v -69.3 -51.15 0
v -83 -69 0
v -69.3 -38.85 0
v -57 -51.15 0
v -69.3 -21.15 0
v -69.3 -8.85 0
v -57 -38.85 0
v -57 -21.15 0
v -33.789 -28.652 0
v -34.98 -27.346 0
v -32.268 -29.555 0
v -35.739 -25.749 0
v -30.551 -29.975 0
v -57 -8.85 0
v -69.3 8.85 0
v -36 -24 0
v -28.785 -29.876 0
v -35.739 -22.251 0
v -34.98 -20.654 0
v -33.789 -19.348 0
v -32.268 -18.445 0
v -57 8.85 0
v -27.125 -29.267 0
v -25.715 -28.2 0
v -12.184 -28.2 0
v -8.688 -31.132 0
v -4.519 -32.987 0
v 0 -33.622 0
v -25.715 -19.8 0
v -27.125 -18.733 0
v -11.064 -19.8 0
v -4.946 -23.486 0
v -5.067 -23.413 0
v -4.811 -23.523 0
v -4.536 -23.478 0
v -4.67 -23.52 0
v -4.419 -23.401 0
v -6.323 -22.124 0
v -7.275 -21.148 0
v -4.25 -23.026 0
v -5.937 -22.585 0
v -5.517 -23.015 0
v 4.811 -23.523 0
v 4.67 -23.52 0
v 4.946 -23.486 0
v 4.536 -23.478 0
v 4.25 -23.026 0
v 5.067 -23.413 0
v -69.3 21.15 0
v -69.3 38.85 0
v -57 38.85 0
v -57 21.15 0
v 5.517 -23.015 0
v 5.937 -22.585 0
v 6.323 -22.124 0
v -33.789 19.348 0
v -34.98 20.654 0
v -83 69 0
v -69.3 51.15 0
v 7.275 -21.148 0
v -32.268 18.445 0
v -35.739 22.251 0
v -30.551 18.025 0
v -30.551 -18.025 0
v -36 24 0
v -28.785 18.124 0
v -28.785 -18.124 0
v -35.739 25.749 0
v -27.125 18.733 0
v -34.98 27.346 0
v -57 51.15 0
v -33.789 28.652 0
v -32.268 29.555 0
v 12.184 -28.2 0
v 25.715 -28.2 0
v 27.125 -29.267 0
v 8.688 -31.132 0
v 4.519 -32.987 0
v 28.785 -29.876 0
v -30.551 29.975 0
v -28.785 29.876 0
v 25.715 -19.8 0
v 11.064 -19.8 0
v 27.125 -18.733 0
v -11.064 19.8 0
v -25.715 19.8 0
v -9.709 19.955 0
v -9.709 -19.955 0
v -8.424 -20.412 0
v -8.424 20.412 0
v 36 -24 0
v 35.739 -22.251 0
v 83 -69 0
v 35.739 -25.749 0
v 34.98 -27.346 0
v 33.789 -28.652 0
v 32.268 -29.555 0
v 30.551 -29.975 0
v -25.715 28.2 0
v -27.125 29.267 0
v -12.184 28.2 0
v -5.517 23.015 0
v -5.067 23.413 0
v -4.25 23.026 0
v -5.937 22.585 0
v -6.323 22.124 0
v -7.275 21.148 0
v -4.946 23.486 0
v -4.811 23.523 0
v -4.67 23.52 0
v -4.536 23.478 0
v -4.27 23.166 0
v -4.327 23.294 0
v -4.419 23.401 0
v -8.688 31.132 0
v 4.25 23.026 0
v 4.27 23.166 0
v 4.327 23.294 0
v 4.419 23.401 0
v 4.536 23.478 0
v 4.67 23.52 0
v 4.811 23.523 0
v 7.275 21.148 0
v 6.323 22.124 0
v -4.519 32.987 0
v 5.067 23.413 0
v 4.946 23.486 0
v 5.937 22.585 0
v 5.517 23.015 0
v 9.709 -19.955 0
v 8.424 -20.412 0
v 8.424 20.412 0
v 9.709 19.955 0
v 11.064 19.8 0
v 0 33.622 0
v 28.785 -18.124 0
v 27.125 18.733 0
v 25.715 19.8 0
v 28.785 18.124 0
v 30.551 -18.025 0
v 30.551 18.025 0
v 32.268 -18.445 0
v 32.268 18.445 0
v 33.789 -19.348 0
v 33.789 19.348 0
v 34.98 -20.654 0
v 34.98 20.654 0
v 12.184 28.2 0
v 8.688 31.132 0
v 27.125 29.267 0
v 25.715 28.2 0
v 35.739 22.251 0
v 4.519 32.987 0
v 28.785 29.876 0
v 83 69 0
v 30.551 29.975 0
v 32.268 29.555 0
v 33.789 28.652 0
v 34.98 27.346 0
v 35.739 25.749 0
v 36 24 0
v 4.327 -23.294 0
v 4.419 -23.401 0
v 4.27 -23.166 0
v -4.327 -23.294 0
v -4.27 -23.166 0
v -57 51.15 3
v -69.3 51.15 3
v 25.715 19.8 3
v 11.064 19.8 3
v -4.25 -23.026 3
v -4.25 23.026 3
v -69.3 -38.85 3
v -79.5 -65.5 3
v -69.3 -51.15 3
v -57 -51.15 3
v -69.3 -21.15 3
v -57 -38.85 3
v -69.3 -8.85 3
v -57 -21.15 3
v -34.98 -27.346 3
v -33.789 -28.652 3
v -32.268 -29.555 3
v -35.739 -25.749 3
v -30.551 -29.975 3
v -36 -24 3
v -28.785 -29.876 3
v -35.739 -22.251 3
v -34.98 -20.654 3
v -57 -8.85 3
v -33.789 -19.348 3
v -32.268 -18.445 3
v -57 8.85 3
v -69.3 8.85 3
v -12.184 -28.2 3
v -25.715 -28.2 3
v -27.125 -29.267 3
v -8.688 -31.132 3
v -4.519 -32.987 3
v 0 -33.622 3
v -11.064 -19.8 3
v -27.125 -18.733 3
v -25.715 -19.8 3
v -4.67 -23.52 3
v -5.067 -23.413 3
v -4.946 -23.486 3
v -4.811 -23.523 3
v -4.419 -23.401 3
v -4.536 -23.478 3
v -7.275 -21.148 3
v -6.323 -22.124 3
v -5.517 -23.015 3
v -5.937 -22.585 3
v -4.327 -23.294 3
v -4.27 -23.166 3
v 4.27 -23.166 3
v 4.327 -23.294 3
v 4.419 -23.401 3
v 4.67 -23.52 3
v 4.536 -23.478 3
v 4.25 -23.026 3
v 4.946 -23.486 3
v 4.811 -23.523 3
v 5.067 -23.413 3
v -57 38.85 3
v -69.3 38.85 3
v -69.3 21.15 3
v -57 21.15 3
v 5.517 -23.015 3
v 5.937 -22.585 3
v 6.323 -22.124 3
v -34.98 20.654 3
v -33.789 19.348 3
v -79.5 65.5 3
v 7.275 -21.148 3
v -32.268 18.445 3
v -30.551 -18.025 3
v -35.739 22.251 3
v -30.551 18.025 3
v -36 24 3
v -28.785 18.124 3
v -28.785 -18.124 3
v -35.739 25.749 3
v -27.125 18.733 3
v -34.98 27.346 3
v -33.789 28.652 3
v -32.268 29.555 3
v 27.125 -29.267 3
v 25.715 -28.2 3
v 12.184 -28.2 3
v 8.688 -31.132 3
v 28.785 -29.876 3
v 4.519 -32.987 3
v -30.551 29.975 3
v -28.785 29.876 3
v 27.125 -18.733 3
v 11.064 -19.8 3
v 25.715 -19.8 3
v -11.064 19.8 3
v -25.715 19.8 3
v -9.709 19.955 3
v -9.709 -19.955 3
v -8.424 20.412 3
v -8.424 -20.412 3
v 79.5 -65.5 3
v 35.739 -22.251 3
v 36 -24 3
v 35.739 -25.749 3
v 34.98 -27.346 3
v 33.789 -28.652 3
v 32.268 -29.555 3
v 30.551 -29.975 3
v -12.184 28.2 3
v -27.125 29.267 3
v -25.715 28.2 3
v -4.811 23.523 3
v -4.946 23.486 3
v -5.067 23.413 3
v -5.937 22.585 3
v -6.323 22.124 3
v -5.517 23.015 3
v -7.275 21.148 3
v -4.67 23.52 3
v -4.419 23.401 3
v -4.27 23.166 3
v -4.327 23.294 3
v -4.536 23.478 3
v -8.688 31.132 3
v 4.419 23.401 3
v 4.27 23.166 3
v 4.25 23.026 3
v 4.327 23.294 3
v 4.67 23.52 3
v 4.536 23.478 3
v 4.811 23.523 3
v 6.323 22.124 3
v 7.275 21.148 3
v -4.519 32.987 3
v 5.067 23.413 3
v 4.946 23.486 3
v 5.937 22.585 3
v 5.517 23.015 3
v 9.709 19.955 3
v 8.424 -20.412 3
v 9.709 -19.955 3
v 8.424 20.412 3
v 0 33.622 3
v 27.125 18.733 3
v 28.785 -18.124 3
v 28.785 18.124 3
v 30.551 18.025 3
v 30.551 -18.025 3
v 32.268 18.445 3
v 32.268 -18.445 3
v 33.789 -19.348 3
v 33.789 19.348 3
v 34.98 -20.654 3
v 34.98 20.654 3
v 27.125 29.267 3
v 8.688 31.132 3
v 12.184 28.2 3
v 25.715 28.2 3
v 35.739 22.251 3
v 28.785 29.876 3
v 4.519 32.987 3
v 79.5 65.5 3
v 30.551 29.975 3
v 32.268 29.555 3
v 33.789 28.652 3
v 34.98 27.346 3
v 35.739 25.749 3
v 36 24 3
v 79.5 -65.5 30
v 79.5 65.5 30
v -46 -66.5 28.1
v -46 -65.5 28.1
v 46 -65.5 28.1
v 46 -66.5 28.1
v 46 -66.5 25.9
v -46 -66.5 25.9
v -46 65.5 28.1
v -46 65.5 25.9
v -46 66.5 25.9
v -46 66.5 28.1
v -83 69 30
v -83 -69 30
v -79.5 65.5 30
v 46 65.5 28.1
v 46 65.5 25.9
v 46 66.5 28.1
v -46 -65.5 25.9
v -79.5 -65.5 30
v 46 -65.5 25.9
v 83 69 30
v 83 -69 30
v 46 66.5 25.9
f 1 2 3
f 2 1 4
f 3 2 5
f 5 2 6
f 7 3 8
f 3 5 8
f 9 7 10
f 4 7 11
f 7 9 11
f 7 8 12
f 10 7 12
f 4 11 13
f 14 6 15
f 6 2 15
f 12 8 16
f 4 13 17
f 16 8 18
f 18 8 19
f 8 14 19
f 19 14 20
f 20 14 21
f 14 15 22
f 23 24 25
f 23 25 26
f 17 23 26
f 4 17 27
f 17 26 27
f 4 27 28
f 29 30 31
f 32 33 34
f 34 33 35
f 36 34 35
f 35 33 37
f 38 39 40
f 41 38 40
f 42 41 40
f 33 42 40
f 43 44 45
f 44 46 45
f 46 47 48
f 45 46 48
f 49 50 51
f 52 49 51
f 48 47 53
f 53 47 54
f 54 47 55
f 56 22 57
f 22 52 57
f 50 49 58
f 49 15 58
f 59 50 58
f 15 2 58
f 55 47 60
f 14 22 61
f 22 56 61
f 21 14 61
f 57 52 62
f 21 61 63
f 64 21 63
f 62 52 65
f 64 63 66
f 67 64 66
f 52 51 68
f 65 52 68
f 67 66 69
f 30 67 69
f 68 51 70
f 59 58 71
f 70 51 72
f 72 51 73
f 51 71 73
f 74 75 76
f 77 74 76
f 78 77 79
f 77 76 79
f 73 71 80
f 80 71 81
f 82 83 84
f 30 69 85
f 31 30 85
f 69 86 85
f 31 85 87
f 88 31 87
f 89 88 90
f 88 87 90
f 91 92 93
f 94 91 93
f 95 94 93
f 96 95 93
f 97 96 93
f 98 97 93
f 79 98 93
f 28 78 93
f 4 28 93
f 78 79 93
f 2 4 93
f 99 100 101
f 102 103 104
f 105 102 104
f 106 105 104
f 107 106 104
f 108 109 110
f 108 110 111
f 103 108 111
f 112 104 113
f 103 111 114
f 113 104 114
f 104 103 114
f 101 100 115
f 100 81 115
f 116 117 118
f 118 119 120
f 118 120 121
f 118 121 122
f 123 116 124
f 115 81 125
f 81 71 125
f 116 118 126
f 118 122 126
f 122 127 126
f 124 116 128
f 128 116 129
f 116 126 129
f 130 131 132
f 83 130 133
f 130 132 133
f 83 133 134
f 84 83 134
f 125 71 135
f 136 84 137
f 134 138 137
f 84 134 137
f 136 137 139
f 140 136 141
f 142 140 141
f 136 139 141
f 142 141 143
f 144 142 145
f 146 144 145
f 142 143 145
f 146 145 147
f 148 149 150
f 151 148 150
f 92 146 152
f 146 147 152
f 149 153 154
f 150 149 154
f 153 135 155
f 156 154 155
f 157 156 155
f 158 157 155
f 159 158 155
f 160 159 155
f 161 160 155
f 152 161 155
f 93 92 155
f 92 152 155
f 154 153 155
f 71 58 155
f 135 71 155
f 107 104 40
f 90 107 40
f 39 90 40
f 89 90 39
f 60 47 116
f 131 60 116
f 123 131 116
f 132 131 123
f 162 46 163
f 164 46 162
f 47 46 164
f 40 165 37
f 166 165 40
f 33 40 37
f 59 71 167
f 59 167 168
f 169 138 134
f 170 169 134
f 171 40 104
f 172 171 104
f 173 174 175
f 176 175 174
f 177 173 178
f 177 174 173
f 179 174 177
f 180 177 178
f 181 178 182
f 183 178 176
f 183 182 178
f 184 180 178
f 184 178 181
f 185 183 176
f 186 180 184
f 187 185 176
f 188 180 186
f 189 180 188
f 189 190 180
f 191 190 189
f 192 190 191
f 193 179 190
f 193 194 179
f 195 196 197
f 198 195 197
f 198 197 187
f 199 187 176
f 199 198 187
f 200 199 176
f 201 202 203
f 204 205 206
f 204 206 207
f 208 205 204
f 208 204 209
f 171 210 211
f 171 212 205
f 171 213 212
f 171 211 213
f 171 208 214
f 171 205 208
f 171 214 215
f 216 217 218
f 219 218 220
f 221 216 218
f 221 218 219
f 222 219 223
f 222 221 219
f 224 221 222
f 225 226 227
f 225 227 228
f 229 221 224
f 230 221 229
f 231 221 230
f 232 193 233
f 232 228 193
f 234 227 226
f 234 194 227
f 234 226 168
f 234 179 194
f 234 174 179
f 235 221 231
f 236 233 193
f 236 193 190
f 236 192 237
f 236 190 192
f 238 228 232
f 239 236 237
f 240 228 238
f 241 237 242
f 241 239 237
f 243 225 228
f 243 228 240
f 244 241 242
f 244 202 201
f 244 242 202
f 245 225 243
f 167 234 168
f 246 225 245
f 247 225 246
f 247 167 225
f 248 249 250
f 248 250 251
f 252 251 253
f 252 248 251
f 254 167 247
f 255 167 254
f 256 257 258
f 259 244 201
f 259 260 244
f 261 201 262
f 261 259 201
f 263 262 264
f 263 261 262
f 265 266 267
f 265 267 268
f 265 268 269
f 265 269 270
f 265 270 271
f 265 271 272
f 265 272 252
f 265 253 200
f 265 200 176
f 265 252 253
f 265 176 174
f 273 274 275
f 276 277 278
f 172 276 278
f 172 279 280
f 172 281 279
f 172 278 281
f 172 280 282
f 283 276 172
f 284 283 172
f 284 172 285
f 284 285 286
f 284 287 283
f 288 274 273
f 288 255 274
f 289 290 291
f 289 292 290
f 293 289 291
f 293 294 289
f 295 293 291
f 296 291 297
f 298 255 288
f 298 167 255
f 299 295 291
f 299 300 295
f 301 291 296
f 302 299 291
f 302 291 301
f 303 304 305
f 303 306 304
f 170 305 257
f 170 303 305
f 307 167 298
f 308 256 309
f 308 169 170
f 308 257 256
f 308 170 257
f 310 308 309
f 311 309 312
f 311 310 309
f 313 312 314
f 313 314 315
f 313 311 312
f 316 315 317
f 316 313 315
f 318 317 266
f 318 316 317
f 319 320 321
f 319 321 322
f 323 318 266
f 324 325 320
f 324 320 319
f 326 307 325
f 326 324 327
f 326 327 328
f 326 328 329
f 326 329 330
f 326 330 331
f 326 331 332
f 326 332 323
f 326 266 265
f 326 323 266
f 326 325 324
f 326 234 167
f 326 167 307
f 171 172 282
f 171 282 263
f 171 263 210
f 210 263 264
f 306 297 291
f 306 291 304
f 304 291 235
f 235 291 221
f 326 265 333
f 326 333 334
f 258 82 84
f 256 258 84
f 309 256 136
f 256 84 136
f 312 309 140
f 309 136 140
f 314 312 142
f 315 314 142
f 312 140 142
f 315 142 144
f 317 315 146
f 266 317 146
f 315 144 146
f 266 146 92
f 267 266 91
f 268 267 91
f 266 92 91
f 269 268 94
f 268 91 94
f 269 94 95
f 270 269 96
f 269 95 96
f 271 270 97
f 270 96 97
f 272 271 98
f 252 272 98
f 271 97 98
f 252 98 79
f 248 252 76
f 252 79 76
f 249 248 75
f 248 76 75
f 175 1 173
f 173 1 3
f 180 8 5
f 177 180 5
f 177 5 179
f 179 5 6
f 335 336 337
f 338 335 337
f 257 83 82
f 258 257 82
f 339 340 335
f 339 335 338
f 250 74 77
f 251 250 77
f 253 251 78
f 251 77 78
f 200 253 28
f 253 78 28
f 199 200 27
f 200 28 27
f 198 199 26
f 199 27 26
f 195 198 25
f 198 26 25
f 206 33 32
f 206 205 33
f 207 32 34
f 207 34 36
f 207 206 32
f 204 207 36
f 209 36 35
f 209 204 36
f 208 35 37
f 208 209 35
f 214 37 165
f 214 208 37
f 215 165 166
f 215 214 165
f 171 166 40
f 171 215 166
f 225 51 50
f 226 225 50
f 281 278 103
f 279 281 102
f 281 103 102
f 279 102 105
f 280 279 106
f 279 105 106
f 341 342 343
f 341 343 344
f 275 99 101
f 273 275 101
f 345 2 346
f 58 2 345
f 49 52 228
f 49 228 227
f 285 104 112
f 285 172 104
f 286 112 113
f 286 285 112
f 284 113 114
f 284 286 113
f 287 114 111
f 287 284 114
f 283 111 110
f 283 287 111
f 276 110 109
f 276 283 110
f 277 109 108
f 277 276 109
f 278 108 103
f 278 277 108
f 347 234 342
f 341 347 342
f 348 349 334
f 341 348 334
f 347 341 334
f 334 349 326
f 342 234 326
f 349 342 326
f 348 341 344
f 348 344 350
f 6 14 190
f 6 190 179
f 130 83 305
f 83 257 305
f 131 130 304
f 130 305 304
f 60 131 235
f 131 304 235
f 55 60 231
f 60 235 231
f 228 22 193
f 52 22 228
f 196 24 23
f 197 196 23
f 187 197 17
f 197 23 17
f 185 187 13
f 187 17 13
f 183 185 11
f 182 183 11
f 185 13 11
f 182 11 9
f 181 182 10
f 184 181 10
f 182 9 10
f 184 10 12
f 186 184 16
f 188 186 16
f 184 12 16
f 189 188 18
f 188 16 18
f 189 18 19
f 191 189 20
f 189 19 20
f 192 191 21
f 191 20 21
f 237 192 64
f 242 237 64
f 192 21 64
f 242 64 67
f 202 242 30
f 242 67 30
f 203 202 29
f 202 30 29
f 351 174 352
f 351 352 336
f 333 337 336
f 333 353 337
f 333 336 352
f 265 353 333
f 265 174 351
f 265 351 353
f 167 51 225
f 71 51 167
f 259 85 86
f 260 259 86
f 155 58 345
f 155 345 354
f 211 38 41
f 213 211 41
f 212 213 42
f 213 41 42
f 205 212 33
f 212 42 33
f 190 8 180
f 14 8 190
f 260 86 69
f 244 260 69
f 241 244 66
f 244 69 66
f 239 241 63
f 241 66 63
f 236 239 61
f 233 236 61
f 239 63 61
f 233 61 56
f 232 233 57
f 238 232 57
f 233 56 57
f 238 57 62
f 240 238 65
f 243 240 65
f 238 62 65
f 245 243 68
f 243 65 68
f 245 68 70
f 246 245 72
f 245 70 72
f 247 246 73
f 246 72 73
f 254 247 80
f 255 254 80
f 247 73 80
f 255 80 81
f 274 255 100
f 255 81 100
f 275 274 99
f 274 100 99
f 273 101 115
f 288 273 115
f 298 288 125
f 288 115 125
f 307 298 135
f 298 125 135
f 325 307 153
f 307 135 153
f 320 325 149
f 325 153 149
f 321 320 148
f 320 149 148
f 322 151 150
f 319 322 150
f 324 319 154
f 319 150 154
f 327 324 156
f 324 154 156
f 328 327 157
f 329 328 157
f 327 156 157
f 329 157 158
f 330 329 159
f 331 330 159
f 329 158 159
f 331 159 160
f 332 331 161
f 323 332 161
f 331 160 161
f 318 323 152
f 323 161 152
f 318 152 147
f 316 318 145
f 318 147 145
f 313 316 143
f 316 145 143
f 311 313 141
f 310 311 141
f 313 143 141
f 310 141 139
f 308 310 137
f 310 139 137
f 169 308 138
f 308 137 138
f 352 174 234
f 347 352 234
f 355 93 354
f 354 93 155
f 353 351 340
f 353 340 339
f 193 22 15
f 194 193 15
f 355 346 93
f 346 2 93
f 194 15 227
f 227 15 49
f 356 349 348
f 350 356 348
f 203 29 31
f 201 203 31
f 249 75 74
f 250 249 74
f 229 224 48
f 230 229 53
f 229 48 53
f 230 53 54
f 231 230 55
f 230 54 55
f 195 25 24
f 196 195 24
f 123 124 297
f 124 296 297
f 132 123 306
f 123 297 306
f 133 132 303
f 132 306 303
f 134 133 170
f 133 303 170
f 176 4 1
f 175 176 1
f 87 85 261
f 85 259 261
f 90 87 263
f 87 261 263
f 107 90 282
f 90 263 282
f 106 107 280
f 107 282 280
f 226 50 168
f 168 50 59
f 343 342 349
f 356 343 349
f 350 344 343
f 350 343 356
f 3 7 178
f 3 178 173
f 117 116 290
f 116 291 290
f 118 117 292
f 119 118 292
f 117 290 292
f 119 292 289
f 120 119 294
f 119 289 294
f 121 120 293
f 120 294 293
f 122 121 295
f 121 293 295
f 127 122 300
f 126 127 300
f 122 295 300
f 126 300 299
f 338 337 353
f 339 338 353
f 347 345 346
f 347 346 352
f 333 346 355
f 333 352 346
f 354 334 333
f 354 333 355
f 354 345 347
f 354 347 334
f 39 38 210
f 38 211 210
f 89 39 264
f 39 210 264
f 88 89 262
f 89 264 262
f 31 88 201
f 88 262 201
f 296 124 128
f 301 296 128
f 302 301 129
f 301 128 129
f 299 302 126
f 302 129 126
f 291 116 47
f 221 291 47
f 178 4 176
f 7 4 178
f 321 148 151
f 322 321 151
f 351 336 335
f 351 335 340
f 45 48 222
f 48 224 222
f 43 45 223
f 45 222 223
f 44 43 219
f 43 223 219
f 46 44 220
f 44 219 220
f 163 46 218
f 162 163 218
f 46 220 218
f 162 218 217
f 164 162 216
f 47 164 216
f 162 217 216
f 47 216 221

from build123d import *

# Parameters (mm, degrees)
SKETCH_1_W           = 166
SKETCH_1_H           = 138
EXTRUDE_1_DEPTH      = 3
SKETCH_2_W           = 166
SKETCH_2_H           = 138
SKETCH_2_W_2         = 159
SKETCH_2_H_2         = 131
EXTRUDE_2_DEPTH      = 27
SKETCH_3_W           = 92
SKETCH_3_H           = 2.2
CUT_EXTRUDE_1_DEPTH  = 1
SKETCH_4_W           = 92
SKETCH_4_H           = 2.2
CUT_EXTRUDE_2_DEPTH  = 1
SKETCH_11_W          = 12.3
SKETCH_11_H          = 12.3
CUT_EXTRUDE_8_DEPTH  = 10
CUT_EXTRUDE_12_DEPTH = 10
FILLET_1_R           = 6
FILLET_2_R           = 0.5


with BuildPart() as part:
    # 스케치1 → 보스-돌출1 (new body)
    with BuildSketch(Plane.XY):
        Rectangle(SKETCH_1_W, SKETCH_1_H)
    extrude(amount=EXTRUDE_1_DEPTH)

    # 스케치2 → 보스-돌출2 (add)
    with BuildSketch(Plane.XY.offset(3)):
        Rectangle(SKETCH_2_W, SKETCH_2_H)
        Rectangle(SKETCH_2_W_2, SKETCH_2_H_2, mode=Mode.SUBTRACT)
    extrude(amount=EXTRUDE_2_DEPTH)

    # 스케치3 → 컷-돌출1 (cut)
    with BuildSketch(Plane.XZ.offset(-65.5)):
        with Locations((0, 27)):
            Rectangle(SKETCH_3_W, SKETCH_3_H)
    extrude(amount=-CUT_EXTRUDE_1_DEPTH, mode=Mode.SUBTRACT)

    # 스케치4 → 컷-돌출2 (cut)
    with BuildSketch(Plane(origin=(0, -65.5, 0), x_dir=(1, 0, 0), z_dir=(0, 1, 0))):
        with Locations((0, -27)):
            Rectangle(SKETCH_4_W, SKETCH_4_H)
    extrude(amount=-CUT_EXTRUDE_2_DEPTH, mode=Mode.SUBTRACT)

    # 스케치11 → 컷-돌출8 (cut)
    with BuildSketch(Plane(origin=(0, 0, 0), x_dir=(-1, 0, 0), z_dir=(0, 0, -1))):
        with Locations((63.15, 15)):
            Rectangle(SKETCH_11_W, SKETCH_11_H)
        with Locations((63.15, 45)):
            Rectangle(SKETCH_11_W, SKETCH_11_H)
        with Locations((63.15, -15)):
            Rectangle(SKETCH_11_W, SKETCH_11_H)
        with Locations((63.15, -45)):
            Rectangle(SKETCH_11_W, SKETCH_11_H)
    extrude(amount=-CUT_EXTRUDE_8_DEPTH, mode=Mode.SUBTRACT)

    # 스케치15 → 컷-돌출12 (cut)
    with BuildSketch(Plane(origin=(0, 0, 0), x_dir=(-1, 0, 0), z_dir=(0, 0, -1))):
        with BuildLine():
            ThreePointArc((25.715142943, -28.2), (36, -24), (25.715142943, -19.8))
            Line((25.715142943, -19.8), (7.573331842, -19.8))
            ThreePointArc((7.573331842, -19.8), (6.273579039, -22.186370807), (4.25, -24))
            Line((4.25, -24), (4.25, 24))
            ThreePointArc((4.25, 24), (6.273579039, 22.186370807), (7.573331842, 19.8))
            Line((7.573331842, 19.8), (25.715142943, 19.8))
            ThreePointArc((25.715142943, 19.8), (36, 24), (25.715142943, 28.2))
            Line((25.715142943, 28.2), (12.183991333, 28.2))
            ThreePointArc((12.183991333, 28.2), (0, 33.622279144), (-12.183991333, 28.2))
            Line((-12.183991333, 28.2), (-25.715142943, 28.2))
            ThreePointArc((-25.715142943, 28.2), (-36, 24), (-25.715142943, 19.8))
            Line((-25.715142943, 19.8), (-7.573331842, 19.8))
            ThreePointArc((-7.573331842, 19.8), (-6.273579039, 22.186370807), (-4.25, 24))
            Line((-4.25, 24), (-4.25, -24))
            ThreePointArc((-4.25, -24), (-6.273579039, -22.186370807), (-7.573331842, -19.8))
            Line((-7.573331842, -19.8), (-25.715142943, -19.8))
            ThreePointArc((-25.715142943, -19.8), (-36, -24), (-25.715142943, -28.2))
            Line((-25.715142943, -28.2), (-12.183991333, -28.2))
            ThreePointArc((-12.183991333, -28.2), (0, -33.622279144), (12.183991333, -28.2))
            Line((12.183991333, -28.2), (25.715142943, -28.2))
        make_face()
    extrude(amount=-CUT_EXTRUDE_12_DEPTH, mode=Mode.SUBTRACT)

    # 필렛1
    fillet_1_edges = [part.edges().sort_by_distance(p)[0] for p in [
        (7.573331842, -19.8, 1.5),
        (-7.573331842, -19.8, 1.5),
        (7.573331842, 19.8, 1.5),
        (-7.573331842, 19.8, 1.5),
    ]]
    fillet(fillet_1_edges, radius=FILLET_1_R)

    # 필렛2
    fillet_2_edges = [part.edges().sort_by_distance(p)[0] for p in [
        (-4.25, -24, 1.5),
        (4.25, 24, 1.5),
        (4.25, -24, 1.5),
        (-4.25, 24, 1.5),
    ]]
    fillet(fillet_2_edges, radius=FILLET_2_R)


solid = part.part
